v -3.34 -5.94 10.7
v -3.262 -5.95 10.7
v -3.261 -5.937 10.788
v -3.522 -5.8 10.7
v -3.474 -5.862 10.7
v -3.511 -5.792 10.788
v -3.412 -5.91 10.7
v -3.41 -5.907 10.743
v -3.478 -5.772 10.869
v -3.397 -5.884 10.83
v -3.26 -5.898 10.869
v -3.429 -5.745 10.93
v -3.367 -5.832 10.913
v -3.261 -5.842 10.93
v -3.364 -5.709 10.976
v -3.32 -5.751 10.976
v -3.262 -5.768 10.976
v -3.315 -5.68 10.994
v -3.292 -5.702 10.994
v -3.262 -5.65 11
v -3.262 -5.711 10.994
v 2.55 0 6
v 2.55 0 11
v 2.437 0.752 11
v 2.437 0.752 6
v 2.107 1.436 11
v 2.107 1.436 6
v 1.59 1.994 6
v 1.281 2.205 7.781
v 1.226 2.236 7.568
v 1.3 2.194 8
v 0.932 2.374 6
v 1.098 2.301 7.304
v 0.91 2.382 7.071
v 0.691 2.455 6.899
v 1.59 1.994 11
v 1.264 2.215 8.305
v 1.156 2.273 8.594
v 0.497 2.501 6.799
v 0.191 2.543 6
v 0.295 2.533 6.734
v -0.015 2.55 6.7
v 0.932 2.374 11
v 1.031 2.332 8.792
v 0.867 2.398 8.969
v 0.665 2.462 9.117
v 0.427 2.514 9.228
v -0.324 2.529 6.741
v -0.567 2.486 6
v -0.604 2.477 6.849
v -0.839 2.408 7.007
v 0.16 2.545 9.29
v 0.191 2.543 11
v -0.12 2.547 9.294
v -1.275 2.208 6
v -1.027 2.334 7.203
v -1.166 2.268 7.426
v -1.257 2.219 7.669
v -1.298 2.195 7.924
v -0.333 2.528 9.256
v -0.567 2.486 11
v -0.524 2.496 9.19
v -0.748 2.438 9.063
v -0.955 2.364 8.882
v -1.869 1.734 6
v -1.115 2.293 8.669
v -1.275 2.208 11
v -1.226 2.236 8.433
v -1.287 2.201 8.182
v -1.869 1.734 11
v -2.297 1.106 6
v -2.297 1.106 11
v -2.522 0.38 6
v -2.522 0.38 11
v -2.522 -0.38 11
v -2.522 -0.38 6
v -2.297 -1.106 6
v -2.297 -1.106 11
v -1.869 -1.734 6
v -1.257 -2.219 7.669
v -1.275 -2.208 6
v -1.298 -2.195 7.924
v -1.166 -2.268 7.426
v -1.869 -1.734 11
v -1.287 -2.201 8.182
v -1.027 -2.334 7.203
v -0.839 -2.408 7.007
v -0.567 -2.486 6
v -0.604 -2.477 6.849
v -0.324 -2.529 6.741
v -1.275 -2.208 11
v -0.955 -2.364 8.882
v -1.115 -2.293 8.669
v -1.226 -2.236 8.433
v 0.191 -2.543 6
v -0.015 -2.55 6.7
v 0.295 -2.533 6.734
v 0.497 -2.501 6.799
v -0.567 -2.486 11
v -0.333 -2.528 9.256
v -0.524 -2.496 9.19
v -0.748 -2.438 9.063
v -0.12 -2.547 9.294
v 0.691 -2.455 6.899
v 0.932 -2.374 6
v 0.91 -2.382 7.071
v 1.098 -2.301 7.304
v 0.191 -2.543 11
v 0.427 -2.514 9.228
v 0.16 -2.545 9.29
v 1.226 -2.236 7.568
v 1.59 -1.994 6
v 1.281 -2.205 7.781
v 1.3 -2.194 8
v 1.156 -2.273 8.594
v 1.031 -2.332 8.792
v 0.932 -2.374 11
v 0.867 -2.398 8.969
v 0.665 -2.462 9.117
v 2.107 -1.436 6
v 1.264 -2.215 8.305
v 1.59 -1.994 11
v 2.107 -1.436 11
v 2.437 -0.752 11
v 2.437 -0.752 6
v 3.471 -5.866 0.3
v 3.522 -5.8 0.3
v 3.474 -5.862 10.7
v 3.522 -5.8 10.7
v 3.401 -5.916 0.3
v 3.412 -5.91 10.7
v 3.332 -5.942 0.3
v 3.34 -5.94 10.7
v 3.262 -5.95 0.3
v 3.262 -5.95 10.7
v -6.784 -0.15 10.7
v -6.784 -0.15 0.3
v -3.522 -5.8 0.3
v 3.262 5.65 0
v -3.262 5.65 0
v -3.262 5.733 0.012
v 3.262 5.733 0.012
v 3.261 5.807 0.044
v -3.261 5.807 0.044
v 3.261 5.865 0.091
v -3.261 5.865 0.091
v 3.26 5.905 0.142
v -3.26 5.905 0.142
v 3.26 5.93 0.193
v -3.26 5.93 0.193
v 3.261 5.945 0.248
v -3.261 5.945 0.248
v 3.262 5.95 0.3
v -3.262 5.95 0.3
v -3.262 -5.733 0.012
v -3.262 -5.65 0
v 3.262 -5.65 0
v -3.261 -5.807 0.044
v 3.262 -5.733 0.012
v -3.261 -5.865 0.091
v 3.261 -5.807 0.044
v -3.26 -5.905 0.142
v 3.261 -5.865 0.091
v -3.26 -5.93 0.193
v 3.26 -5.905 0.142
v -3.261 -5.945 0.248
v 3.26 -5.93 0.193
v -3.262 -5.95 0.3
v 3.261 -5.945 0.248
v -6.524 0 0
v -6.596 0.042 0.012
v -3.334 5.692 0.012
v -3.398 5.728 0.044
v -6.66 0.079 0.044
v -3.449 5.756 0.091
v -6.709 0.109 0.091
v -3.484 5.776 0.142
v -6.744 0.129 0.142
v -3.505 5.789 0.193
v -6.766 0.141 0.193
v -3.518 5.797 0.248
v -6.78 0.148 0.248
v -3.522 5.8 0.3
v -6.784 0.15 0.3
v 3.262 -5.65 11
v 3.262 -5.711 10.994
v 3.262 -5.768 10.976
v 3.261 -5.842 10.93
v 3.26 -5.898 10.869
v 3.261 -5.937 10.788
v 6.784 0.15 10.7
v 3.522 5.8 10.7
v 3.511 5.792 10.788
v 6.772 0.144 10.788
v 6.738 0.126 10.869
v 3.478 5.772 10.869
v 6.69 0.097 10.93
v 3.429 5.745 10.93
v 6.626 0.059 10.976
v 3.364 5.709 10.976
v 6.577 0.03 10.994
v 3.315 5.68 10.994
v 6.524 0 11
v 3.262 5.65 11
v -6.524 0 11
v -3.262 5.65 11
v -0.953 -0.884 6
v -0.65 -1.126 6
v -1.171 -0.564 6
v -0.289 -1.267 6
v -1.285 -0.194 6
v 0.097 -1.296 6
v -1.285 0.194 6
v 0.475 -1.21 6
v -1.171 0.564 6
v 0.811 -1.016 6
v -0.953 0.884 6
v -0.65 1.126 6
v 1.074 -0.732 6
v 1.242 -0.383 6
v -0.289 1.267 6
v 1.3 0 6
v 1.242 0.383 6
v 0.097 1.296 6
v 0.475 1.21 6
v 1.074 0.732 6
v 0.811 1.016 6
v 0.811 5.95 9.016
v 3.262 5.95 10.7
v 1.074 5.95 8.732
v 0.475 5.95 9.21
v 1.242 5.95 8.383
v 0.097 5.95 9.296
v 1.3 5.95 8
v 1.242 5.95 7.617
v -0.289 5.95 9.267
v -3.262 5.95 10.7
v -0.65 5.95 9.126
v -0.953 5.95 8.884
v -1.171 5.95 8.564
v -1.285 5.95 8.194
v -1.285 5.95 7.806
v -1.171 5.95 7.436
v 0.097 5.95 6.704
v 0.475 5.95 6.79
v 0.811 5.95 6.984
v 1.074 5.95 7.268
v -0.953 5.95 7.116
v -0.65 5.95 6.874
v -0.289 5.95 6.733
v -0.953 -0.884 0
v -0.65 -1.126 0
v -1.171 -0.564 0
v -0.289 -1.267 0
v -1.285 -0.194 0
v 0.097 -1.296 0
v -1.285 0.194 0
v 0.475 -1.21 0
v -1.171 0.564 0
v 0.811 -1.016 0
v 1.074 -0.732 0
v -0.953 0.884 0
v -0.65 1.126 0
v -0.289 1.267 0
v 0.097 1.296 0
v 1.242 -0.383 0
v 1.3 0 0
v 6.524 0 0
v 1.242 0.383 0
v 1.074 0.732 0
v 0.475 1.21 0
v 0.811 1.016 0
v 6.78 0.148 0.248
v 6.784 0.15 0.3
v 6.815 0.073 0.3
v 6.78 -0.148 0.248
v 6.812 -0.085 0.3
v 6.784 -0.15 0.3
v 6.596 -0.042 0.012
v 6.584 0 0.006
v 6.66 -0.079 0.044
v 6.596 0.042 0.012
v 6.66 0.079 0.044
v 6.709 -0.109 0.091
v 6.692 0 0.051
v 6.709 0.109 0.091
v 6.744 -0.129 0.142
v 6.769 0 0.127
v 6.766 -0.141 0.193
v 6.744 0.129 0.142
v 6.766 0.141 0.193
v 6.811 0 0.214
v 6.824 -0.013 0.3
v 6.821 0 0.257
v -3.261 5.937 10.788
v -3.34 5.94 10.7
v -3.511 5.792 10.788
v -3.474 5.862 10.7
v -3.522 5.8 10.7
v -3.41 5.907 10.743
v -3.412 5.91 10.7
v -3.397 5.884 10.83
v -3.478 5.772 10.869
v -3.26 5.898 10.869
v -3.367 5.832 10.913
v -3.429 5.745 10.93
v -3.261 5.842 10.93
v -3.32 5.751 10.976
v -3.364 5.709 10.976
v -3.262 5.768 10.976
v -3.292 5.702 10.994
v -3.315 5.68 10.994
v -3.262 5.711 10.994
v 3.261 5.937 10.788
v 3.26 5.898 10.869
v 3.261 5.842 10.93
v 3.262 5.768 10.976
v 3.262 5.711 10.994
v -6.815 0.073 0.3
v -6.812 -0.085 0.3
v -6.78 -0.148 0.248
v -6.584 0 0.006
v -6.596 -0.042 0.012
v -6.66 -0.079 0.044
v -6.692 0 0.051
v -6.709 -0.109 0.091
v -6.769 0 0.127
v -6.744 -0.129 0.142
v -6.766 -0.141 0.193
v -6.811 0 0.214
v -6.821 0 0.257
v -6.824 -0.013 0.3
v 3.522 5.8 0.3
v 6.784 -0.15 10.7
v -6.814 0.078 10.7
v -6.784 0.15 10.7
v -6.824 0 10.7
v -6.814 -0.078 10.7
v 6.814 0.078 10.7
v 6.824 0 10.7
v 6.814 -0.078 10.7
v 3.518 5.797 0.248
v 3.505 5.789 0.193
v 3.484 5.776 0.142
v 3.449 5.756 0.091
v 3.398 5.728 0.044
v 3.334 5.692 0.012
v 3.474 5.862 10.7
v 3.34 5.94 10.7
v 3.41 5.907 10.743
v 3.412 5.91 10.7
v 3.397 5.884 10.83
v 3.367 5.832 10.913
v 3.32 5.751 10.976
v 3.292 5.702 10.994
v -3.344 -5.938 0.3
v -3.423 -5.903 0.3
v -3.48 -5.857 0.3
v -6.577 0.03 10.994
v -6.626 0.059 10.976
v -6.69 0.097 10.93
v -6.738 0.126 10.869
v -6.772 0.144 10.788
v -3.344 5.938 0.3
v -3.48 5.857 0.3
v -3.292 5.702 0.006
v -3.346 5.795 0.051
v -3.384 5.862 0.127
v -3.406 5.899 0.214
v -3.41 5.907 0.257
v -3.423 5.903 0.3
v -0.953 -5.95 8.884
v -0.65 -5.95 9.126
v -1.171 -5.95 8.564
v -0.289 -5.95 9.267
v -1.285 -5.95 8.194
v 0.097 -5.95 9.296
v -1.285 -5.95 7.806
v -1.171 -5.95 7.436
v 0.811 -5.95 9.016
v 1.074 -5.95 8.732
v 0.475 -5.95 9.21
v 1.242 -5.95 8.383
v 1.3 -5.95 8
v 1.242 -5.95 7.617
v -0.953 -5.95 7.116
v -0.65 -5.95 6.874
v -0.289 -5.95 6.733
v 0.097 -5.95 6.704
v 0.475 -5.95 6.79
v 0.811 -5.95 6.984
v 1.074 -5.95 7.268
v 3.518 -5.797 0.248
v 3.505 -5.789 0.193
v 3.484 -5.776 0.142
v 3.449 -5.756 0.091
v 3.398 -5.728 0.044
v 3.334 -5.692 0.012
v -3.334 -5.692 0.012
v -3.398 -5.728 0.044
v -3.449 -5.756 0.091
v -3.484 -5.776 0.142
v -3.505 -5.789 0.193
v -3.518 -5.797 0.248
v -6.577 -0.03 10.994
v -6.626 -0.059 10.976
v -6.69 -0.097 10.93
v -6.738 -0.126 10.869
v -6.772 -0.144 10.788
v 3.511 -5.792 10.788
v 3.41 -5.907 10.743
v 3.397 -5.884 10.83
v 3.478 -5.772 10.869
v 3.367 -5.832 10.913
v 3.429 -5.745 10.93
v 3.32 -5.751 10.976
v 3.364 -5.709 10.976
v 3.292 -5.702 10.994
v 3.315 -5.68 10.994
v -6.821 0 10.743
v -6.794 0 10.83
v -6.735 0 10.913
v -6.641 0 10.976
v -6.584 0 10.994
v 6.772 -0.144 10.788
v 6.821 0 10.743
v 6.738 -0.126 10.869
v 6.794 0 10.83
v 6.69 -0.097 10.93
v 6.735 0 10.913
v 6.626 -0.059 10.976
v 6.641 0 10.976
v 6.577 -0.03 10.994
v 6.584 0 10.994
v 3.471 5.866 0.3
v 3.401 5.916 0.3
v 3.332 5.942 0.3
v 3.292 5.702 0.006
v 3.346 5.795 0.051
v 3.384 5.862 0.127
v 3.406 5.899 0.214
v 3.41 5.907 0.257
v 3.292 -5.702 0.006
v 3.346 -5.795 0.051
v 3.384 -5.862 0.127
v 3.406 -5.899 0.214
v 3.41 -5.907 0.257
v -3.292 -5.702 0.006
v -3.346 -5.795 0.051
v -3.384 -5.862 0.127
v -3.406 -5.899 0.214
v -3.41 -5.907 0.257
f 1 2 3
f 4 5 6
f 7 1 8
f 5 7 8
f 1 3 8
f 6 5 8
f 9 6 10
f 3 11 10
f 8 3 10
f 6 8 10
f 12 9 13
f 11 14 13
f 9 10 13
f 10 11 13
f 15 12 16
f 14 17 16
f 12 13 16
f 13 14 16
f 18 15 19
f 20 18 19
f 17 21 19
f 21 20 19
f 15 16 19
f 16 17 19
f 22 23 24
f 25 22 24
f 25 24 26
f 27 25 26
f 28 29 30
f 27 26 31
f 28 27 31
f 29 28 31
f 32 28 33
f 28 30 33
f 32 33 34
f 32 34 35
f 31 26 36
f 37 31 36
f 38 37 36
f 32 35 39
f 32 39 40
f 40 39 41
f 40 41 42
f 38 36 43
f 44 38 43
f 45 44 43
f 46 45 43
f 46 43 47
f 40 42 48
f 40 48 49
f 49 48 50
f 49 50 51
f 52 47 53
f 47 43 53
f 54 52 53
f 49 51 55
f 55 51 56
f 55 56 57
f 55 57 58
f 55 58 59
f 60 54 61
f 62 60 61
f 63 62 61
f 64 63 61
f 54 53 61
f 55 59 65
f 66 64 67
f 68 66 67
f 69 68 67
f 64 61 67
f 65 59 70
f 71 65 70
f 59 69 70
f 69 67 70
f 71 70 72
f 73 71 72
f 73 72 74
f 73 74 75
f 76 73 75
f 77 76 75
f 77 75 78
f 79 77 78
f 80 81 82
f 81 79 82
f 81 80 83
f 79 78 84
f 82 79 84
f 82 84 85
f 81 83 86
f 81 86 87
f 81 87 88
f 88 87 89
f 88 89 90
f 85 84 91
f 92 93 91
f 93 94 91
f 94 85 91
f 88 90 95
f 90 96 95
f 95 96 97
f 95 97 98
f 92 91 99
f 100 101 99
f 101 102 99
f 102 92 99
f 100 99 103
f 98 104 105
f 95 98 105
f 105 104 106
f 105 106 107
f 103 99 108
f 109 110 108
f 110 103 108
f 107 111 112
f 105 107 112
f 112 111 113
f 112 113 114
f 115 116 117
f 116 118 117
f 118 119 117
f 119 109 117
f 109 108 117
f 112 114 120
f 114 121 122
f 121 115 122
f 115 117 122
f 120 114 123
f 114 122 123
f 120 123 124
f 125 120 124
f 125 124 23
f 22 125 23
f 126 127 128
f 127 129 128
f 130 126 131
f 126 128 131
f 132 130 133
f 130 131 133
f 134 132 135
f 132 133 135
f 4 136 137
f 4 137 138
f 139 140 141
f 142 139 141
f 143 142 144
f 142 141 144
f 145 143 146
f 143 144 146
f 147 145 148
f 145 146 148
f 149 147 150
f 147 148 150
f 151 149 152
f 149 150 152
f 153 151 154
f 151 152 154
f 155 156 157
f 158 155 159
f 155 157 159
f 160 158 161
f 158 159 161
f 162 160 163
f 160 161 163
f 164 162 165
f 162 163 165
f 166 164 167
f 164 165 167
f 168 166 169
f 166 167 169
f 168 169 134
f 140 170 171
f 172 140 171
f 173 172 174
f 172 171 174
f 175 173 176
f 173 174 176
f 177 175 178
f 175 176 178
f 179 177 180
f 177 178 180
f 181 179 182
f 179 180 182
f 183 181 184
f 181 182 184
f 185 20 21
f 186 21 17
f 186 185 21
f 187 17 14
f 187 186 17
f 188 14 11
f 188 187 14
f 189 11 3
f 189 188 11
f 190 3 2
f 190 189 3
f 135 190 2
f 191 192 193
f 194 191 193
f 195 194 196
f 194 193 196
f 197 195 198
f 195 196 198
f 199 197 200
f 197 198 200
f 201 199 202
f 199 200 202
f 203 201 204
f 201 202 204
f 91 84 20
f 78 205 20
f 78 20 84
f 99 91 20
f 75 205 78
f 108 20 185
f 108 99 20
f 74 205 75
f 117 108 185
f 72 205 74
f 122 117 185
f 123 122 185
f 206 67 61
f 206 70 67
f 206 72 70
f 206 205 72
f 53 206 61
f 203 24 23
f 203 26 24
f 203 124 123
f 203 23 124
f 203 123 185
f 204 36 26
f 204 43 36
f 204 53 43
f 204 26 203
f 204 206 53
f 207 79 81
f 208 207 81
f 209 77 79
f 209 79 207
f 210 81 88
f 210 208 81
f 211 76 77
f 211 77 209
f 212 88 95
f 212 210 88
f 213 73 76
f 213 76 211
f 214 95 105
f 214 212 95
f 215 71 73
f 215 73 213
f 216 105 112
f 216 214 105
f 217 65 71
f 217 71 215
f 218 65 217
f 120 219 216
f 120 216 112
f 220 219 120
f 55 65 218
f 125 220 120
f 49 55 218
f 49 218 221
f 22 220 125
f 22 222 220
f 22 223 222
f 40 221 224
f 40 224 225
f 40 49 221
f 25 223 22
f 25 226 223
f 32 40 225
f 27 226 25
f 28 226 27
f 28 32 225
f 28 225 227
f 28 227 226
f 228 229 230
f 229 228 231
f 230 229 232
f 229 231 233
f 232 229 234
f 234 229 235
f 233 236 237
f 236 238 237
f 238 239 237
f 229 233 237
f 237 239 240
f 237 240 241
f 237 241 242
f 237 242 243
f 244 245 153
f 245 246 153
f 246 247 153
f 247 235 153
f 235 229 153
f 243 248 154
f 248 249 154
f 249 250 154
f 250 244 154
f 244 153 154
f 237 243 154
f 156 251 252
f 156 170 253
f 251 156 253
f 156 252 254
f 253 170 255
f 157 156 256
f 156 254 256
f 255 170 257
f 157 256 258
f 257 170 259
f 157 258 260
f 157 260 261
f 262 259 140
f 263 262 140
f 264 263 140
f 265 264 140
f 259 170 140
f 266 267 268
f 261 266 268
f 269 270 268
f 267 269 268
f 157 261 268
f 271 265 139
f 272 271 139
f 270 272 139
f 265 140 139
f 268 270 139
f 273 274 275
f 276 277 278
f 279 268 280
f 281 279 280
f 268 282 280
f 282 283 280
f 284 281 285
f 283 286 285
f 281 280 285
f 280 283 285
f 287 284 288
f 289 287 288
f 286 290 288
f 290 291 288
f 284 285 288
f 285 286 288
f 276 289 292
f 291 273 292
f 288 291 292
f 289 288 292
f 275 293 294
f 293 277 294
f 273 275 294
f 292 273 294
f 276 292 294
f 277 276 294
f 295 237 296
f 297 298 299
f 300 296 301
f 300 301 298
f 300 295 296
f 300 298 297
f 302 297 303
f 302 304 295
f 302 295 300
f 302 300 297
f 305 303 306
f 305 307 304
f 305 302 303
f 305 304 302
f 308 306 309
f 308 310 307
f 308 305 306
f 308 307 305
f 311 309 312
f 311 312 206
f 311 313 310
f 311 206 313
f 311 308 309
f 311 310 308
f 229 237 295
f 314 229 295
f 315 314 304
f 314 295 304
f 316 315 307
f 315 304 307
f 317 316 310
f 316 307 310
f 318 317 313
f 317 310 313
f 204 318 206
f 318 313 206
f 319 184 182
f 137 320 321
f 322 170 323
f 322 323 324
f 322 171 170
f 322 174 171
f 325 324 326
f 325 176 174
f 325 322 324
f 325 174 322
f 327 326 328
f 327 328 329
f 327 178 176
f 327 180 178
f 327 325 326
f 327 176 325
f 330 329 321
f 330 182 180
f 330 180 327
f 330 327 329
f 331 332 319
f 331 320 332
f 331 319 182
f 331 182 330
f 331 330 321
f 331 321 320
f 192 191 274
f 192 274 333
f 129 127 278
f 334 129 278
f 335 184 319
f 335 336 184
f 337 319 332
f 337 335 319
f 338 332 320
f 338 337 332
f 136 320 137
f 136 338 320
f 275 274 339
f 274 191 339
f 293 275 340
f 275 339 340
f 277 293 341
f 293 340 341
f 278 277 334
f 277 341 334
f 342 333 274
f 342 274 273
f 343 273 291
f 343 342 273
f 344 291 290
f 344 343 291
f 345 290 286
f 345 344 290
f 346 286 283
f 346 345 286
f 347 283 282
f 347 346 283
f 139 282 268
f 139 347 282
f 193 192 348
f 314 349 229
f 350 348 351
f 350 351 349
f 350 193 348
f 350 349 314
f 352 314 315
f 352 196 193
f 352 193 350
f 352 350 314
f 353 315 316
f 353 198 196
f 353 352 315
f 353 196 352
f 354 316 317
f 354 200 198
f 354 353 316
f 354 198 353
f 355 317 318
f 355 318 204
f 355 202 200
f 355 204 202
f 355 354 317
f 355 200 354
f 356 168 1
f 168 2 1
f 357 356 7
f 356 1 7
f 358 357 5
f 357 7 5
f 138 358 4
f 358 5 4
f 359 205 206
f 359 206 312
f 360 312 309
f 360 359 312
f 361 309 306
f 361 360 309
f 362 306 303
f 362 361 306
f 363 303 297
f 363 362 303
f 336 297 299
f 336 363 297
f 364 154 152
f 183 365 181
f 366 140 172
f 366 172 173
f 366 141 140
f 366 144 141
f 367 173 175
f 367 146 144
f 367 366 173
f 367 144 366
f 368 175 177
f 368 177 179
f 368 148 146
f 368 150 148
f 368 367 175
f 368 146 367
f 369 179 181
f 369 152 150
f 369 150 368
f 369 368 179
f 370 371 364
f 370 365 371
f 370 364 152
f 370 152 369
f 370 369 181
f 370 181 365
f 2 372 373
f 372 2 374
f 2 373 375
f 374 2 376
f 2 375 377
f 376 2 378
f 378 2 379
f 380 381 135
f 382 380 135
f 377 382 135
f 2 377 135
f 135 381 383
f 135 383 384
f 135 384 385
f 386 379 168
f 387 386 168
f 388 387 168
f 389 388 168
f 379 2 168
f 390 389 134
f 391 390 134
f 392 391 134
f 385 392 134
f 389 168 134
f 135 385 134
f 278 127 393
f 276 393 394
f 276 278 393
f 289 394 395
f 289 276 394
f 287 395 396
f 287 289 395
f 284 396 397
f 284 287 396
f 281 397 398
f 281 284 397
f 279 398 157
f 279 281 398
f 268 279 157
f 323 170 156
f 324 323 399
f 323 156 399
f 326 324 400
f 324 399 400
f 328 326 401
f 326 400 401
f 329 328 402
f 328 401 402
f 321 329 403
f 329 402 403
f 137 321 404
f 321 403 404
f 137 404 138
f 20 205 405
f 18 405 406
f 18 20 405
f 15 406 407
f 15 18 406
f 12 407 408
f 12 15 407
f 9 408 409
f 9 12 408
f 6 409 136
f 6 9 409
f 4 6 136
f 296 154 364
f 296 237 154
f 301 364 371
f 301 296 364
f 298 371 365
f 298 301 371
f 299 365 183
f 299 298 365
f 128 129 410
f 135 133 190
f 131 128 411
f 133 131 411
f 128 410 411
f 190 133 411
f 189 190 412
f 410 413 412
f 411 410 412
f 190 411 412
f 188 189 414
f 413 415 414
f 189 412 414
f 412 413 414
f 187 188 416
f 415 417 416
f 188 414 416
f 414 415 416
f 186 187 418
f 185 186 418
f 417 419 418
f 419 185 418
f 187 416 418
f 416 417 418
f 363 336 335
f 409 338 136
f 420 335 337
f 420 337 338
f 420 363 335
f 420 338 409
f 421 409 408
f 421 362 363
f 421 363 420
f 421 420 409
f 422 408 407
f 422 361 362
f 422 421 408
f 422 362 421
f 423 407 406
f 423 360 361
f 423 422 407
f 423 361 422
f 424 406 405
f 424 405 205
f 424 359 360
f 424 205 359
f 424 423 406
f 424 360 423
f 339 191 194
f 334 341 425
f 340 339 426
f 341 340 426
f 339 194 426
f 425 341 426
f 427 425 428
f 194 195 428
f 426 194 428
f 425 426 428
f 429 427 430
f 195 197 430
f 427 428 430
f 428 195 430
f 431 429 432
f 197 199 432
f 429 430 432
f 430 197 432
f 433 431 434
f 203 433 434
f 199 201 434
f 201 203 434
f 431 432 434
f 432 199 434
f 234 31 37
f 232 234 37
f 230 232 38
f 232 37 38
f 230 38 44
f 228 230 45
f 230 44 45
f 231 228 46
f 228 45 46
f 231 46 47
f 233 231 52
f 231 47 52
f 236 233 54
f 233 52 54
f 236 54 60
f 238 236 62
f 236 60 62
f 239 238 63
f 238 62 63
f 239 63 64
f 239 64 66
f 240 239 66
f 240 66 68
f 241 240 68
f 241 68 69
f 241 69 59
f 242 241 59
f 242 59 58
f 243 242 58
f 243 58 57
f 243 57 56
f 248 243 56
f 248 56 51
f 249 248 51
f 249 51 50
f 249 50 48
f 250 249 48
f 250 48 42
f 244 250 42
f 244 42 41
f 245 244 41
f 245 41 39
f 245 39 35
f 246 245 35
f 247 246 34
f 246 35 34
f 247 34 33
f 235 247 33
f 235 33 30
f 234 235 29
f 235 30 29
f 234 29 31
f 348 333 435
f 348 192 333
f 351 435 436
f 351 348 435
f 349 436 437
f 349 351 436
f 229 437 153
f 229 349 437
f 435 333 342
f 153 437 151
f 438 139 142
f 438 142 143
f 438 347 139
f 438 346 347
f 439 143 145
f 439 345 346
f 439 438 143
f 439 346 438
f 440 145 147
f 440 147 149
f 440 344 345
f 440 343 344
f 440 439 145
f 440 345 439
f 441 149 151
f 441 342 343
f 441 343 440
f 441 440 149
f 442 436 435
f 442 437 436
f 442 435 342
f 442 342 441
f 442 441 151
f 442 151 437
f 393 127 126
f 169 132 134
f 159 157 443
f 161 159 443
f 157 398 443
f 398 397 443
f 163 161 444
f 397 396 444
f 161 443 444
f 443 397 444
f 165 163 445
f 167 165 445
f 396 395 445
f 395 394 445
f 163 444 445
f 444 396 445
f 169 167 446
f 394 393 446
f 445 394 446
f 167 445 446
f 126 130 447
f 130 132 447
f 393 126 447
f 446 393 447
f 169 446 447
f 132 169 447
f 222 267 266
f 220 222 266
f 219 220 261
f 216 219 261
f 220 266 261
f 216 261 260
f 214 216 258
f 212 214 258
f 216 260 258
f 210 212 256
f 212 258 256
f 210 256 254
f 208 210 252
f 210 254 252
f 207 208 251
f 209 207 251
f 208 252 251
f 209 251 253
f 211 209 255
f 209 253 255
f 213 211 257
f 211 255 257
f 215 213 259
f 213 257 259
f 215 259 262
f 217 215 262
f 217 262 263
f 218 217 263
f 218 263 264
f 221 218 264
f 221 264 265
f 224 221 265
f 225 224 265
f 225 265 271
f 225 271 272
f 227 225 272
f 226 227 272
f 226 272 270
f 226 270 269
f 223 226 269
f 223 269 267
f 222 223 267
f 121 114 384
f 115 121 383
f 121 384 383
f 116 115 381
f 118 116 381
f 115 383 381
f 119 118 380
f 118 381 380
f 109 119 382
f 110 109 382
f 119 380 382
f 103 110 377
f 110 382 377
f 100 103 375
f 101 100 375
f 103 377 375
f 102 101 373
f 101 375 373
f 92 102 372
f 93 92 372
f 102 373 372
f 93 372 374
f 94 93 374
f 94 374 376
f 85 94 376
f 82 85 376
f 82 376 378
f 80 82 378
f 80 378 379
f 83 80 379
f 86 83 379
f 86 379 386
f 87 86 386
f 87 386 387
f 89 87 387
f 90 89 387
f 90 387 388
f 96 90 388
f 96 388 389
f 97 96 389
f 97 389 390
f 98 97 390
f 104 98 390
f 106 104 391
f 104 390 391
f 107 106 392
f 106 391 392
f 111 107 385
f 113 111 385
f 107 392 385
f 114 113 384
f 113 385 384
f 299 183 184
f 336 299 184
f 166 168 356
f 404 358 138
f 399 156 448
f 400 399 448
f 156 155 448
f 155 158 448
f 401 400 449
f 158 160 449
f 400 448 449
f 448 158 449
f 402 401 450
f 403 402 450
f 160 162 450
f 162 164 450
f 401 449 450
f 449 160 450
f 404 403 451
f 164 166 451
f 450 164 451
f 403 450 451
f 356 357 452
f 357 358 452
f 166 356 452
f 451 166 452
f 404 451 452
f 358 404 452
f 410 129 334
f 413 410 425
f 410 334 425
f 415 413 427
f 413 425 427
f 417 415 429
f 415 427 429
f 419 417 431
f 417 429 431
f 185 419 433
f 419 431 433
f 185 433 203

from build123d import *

# Parameters (mm, degrees)
PAD_DEPTH       = 11
SKETCH001_R     = 2.55
POCKET_DEPTH    = 5
SKETCH002_R     = 1.3
POCKET001_DEPTH = 7
SKETCH003_R     = 1.3
POCKET002_DEPTH = 12
FILLET_R        = 0.3
FILLET001_R     = 0.3
FILLET002_R     = 0.3


with BuildPart() as part:
    # Sketch → Pad (new body)
    with BuildSketch(Plane.XY):
        Polygon((6.870468, 0), (3.435234, 5.95), (-3.435234, 5.95), (-6.870468, 0), (-3.435234, -5.95), (3.435234, -5.95), align=None)
    extrude(amount=PAD_DEPTH)

    # Sketch001 (on Face8 of Pad) → Pocket (cut)
    with BuildSketch(Plane.XY.offset(11)):
        Circle(SKETCH001_R)
    extrude(amount=-POCKET_DEPTH, mode=Mode.SUBTRACT)

    # Sketch002 (on Face4 of Pocket) → Pocket001 (cut)
    with BuildSketch(Plane(origin=(0, 0, 0), x_dir=(1, 0, 0), z_dir=(0, 0, -1))):
        Circle(SKETCH002_R)
    extrude(amount=-POCKET001_DEPTH, mode=Mode.SUBTRACT)

    # Sketch003 (on Face6 of Pocket001) → Pocket002 (cut)
    with BuildSketch(Plane.XZ.offset(5.95)):
        with Locations((0, 8)):
            Circle(SKETCH003_R)
    extrude(amount=-POCKET002_DEPTH, mode=Mode.SUBTRACT)

    # Fillet
    fillet_edges = [part.edges().sort_by_distance(p)[0] for p in [
        (5.152851, -2.975, 11),
        (0, -5.95, 11),
        (-5.152851, -2.975, 11),
        (-5.152851, 2.975, 11),
        (0, 5.95, 11),
        (5.152851, 2.975, 11),
    ]]
    fillet(fillet_edges, radius=FILLET_R)

    # Fillet001
    fillet001_edges = [part.edges().sort_by_distance(p)[0] for p in [
        (0, 5.95, 0),
        (-5.152851, 2.975, 0),
        (-5.152851, -2.975, 0),
        (0, -5.95, 0),
        (5.152851, -2.975, 0),
        (5.152851, 2.975, 0),
    ]]
    fillet(fillet001_edges, radius=FILLET001_R)

    # Fillet002
    fillet002_edges = [part.edges().sort_by_distance(p)[0] for p in [
        (3.435234, -5.95, 5.5),
        (6.870468, 0, 5.5),
        (-3.435234, -5.95, 5.5),
        (-6.870468, 0, 5.5),
        (-3.435234, 5.95, 5.5),
        (3.435234, 5.95, 5.5),
    ]]
    fillet(fillet002_edges, radius=FILLET002_R)


solid = part.part
